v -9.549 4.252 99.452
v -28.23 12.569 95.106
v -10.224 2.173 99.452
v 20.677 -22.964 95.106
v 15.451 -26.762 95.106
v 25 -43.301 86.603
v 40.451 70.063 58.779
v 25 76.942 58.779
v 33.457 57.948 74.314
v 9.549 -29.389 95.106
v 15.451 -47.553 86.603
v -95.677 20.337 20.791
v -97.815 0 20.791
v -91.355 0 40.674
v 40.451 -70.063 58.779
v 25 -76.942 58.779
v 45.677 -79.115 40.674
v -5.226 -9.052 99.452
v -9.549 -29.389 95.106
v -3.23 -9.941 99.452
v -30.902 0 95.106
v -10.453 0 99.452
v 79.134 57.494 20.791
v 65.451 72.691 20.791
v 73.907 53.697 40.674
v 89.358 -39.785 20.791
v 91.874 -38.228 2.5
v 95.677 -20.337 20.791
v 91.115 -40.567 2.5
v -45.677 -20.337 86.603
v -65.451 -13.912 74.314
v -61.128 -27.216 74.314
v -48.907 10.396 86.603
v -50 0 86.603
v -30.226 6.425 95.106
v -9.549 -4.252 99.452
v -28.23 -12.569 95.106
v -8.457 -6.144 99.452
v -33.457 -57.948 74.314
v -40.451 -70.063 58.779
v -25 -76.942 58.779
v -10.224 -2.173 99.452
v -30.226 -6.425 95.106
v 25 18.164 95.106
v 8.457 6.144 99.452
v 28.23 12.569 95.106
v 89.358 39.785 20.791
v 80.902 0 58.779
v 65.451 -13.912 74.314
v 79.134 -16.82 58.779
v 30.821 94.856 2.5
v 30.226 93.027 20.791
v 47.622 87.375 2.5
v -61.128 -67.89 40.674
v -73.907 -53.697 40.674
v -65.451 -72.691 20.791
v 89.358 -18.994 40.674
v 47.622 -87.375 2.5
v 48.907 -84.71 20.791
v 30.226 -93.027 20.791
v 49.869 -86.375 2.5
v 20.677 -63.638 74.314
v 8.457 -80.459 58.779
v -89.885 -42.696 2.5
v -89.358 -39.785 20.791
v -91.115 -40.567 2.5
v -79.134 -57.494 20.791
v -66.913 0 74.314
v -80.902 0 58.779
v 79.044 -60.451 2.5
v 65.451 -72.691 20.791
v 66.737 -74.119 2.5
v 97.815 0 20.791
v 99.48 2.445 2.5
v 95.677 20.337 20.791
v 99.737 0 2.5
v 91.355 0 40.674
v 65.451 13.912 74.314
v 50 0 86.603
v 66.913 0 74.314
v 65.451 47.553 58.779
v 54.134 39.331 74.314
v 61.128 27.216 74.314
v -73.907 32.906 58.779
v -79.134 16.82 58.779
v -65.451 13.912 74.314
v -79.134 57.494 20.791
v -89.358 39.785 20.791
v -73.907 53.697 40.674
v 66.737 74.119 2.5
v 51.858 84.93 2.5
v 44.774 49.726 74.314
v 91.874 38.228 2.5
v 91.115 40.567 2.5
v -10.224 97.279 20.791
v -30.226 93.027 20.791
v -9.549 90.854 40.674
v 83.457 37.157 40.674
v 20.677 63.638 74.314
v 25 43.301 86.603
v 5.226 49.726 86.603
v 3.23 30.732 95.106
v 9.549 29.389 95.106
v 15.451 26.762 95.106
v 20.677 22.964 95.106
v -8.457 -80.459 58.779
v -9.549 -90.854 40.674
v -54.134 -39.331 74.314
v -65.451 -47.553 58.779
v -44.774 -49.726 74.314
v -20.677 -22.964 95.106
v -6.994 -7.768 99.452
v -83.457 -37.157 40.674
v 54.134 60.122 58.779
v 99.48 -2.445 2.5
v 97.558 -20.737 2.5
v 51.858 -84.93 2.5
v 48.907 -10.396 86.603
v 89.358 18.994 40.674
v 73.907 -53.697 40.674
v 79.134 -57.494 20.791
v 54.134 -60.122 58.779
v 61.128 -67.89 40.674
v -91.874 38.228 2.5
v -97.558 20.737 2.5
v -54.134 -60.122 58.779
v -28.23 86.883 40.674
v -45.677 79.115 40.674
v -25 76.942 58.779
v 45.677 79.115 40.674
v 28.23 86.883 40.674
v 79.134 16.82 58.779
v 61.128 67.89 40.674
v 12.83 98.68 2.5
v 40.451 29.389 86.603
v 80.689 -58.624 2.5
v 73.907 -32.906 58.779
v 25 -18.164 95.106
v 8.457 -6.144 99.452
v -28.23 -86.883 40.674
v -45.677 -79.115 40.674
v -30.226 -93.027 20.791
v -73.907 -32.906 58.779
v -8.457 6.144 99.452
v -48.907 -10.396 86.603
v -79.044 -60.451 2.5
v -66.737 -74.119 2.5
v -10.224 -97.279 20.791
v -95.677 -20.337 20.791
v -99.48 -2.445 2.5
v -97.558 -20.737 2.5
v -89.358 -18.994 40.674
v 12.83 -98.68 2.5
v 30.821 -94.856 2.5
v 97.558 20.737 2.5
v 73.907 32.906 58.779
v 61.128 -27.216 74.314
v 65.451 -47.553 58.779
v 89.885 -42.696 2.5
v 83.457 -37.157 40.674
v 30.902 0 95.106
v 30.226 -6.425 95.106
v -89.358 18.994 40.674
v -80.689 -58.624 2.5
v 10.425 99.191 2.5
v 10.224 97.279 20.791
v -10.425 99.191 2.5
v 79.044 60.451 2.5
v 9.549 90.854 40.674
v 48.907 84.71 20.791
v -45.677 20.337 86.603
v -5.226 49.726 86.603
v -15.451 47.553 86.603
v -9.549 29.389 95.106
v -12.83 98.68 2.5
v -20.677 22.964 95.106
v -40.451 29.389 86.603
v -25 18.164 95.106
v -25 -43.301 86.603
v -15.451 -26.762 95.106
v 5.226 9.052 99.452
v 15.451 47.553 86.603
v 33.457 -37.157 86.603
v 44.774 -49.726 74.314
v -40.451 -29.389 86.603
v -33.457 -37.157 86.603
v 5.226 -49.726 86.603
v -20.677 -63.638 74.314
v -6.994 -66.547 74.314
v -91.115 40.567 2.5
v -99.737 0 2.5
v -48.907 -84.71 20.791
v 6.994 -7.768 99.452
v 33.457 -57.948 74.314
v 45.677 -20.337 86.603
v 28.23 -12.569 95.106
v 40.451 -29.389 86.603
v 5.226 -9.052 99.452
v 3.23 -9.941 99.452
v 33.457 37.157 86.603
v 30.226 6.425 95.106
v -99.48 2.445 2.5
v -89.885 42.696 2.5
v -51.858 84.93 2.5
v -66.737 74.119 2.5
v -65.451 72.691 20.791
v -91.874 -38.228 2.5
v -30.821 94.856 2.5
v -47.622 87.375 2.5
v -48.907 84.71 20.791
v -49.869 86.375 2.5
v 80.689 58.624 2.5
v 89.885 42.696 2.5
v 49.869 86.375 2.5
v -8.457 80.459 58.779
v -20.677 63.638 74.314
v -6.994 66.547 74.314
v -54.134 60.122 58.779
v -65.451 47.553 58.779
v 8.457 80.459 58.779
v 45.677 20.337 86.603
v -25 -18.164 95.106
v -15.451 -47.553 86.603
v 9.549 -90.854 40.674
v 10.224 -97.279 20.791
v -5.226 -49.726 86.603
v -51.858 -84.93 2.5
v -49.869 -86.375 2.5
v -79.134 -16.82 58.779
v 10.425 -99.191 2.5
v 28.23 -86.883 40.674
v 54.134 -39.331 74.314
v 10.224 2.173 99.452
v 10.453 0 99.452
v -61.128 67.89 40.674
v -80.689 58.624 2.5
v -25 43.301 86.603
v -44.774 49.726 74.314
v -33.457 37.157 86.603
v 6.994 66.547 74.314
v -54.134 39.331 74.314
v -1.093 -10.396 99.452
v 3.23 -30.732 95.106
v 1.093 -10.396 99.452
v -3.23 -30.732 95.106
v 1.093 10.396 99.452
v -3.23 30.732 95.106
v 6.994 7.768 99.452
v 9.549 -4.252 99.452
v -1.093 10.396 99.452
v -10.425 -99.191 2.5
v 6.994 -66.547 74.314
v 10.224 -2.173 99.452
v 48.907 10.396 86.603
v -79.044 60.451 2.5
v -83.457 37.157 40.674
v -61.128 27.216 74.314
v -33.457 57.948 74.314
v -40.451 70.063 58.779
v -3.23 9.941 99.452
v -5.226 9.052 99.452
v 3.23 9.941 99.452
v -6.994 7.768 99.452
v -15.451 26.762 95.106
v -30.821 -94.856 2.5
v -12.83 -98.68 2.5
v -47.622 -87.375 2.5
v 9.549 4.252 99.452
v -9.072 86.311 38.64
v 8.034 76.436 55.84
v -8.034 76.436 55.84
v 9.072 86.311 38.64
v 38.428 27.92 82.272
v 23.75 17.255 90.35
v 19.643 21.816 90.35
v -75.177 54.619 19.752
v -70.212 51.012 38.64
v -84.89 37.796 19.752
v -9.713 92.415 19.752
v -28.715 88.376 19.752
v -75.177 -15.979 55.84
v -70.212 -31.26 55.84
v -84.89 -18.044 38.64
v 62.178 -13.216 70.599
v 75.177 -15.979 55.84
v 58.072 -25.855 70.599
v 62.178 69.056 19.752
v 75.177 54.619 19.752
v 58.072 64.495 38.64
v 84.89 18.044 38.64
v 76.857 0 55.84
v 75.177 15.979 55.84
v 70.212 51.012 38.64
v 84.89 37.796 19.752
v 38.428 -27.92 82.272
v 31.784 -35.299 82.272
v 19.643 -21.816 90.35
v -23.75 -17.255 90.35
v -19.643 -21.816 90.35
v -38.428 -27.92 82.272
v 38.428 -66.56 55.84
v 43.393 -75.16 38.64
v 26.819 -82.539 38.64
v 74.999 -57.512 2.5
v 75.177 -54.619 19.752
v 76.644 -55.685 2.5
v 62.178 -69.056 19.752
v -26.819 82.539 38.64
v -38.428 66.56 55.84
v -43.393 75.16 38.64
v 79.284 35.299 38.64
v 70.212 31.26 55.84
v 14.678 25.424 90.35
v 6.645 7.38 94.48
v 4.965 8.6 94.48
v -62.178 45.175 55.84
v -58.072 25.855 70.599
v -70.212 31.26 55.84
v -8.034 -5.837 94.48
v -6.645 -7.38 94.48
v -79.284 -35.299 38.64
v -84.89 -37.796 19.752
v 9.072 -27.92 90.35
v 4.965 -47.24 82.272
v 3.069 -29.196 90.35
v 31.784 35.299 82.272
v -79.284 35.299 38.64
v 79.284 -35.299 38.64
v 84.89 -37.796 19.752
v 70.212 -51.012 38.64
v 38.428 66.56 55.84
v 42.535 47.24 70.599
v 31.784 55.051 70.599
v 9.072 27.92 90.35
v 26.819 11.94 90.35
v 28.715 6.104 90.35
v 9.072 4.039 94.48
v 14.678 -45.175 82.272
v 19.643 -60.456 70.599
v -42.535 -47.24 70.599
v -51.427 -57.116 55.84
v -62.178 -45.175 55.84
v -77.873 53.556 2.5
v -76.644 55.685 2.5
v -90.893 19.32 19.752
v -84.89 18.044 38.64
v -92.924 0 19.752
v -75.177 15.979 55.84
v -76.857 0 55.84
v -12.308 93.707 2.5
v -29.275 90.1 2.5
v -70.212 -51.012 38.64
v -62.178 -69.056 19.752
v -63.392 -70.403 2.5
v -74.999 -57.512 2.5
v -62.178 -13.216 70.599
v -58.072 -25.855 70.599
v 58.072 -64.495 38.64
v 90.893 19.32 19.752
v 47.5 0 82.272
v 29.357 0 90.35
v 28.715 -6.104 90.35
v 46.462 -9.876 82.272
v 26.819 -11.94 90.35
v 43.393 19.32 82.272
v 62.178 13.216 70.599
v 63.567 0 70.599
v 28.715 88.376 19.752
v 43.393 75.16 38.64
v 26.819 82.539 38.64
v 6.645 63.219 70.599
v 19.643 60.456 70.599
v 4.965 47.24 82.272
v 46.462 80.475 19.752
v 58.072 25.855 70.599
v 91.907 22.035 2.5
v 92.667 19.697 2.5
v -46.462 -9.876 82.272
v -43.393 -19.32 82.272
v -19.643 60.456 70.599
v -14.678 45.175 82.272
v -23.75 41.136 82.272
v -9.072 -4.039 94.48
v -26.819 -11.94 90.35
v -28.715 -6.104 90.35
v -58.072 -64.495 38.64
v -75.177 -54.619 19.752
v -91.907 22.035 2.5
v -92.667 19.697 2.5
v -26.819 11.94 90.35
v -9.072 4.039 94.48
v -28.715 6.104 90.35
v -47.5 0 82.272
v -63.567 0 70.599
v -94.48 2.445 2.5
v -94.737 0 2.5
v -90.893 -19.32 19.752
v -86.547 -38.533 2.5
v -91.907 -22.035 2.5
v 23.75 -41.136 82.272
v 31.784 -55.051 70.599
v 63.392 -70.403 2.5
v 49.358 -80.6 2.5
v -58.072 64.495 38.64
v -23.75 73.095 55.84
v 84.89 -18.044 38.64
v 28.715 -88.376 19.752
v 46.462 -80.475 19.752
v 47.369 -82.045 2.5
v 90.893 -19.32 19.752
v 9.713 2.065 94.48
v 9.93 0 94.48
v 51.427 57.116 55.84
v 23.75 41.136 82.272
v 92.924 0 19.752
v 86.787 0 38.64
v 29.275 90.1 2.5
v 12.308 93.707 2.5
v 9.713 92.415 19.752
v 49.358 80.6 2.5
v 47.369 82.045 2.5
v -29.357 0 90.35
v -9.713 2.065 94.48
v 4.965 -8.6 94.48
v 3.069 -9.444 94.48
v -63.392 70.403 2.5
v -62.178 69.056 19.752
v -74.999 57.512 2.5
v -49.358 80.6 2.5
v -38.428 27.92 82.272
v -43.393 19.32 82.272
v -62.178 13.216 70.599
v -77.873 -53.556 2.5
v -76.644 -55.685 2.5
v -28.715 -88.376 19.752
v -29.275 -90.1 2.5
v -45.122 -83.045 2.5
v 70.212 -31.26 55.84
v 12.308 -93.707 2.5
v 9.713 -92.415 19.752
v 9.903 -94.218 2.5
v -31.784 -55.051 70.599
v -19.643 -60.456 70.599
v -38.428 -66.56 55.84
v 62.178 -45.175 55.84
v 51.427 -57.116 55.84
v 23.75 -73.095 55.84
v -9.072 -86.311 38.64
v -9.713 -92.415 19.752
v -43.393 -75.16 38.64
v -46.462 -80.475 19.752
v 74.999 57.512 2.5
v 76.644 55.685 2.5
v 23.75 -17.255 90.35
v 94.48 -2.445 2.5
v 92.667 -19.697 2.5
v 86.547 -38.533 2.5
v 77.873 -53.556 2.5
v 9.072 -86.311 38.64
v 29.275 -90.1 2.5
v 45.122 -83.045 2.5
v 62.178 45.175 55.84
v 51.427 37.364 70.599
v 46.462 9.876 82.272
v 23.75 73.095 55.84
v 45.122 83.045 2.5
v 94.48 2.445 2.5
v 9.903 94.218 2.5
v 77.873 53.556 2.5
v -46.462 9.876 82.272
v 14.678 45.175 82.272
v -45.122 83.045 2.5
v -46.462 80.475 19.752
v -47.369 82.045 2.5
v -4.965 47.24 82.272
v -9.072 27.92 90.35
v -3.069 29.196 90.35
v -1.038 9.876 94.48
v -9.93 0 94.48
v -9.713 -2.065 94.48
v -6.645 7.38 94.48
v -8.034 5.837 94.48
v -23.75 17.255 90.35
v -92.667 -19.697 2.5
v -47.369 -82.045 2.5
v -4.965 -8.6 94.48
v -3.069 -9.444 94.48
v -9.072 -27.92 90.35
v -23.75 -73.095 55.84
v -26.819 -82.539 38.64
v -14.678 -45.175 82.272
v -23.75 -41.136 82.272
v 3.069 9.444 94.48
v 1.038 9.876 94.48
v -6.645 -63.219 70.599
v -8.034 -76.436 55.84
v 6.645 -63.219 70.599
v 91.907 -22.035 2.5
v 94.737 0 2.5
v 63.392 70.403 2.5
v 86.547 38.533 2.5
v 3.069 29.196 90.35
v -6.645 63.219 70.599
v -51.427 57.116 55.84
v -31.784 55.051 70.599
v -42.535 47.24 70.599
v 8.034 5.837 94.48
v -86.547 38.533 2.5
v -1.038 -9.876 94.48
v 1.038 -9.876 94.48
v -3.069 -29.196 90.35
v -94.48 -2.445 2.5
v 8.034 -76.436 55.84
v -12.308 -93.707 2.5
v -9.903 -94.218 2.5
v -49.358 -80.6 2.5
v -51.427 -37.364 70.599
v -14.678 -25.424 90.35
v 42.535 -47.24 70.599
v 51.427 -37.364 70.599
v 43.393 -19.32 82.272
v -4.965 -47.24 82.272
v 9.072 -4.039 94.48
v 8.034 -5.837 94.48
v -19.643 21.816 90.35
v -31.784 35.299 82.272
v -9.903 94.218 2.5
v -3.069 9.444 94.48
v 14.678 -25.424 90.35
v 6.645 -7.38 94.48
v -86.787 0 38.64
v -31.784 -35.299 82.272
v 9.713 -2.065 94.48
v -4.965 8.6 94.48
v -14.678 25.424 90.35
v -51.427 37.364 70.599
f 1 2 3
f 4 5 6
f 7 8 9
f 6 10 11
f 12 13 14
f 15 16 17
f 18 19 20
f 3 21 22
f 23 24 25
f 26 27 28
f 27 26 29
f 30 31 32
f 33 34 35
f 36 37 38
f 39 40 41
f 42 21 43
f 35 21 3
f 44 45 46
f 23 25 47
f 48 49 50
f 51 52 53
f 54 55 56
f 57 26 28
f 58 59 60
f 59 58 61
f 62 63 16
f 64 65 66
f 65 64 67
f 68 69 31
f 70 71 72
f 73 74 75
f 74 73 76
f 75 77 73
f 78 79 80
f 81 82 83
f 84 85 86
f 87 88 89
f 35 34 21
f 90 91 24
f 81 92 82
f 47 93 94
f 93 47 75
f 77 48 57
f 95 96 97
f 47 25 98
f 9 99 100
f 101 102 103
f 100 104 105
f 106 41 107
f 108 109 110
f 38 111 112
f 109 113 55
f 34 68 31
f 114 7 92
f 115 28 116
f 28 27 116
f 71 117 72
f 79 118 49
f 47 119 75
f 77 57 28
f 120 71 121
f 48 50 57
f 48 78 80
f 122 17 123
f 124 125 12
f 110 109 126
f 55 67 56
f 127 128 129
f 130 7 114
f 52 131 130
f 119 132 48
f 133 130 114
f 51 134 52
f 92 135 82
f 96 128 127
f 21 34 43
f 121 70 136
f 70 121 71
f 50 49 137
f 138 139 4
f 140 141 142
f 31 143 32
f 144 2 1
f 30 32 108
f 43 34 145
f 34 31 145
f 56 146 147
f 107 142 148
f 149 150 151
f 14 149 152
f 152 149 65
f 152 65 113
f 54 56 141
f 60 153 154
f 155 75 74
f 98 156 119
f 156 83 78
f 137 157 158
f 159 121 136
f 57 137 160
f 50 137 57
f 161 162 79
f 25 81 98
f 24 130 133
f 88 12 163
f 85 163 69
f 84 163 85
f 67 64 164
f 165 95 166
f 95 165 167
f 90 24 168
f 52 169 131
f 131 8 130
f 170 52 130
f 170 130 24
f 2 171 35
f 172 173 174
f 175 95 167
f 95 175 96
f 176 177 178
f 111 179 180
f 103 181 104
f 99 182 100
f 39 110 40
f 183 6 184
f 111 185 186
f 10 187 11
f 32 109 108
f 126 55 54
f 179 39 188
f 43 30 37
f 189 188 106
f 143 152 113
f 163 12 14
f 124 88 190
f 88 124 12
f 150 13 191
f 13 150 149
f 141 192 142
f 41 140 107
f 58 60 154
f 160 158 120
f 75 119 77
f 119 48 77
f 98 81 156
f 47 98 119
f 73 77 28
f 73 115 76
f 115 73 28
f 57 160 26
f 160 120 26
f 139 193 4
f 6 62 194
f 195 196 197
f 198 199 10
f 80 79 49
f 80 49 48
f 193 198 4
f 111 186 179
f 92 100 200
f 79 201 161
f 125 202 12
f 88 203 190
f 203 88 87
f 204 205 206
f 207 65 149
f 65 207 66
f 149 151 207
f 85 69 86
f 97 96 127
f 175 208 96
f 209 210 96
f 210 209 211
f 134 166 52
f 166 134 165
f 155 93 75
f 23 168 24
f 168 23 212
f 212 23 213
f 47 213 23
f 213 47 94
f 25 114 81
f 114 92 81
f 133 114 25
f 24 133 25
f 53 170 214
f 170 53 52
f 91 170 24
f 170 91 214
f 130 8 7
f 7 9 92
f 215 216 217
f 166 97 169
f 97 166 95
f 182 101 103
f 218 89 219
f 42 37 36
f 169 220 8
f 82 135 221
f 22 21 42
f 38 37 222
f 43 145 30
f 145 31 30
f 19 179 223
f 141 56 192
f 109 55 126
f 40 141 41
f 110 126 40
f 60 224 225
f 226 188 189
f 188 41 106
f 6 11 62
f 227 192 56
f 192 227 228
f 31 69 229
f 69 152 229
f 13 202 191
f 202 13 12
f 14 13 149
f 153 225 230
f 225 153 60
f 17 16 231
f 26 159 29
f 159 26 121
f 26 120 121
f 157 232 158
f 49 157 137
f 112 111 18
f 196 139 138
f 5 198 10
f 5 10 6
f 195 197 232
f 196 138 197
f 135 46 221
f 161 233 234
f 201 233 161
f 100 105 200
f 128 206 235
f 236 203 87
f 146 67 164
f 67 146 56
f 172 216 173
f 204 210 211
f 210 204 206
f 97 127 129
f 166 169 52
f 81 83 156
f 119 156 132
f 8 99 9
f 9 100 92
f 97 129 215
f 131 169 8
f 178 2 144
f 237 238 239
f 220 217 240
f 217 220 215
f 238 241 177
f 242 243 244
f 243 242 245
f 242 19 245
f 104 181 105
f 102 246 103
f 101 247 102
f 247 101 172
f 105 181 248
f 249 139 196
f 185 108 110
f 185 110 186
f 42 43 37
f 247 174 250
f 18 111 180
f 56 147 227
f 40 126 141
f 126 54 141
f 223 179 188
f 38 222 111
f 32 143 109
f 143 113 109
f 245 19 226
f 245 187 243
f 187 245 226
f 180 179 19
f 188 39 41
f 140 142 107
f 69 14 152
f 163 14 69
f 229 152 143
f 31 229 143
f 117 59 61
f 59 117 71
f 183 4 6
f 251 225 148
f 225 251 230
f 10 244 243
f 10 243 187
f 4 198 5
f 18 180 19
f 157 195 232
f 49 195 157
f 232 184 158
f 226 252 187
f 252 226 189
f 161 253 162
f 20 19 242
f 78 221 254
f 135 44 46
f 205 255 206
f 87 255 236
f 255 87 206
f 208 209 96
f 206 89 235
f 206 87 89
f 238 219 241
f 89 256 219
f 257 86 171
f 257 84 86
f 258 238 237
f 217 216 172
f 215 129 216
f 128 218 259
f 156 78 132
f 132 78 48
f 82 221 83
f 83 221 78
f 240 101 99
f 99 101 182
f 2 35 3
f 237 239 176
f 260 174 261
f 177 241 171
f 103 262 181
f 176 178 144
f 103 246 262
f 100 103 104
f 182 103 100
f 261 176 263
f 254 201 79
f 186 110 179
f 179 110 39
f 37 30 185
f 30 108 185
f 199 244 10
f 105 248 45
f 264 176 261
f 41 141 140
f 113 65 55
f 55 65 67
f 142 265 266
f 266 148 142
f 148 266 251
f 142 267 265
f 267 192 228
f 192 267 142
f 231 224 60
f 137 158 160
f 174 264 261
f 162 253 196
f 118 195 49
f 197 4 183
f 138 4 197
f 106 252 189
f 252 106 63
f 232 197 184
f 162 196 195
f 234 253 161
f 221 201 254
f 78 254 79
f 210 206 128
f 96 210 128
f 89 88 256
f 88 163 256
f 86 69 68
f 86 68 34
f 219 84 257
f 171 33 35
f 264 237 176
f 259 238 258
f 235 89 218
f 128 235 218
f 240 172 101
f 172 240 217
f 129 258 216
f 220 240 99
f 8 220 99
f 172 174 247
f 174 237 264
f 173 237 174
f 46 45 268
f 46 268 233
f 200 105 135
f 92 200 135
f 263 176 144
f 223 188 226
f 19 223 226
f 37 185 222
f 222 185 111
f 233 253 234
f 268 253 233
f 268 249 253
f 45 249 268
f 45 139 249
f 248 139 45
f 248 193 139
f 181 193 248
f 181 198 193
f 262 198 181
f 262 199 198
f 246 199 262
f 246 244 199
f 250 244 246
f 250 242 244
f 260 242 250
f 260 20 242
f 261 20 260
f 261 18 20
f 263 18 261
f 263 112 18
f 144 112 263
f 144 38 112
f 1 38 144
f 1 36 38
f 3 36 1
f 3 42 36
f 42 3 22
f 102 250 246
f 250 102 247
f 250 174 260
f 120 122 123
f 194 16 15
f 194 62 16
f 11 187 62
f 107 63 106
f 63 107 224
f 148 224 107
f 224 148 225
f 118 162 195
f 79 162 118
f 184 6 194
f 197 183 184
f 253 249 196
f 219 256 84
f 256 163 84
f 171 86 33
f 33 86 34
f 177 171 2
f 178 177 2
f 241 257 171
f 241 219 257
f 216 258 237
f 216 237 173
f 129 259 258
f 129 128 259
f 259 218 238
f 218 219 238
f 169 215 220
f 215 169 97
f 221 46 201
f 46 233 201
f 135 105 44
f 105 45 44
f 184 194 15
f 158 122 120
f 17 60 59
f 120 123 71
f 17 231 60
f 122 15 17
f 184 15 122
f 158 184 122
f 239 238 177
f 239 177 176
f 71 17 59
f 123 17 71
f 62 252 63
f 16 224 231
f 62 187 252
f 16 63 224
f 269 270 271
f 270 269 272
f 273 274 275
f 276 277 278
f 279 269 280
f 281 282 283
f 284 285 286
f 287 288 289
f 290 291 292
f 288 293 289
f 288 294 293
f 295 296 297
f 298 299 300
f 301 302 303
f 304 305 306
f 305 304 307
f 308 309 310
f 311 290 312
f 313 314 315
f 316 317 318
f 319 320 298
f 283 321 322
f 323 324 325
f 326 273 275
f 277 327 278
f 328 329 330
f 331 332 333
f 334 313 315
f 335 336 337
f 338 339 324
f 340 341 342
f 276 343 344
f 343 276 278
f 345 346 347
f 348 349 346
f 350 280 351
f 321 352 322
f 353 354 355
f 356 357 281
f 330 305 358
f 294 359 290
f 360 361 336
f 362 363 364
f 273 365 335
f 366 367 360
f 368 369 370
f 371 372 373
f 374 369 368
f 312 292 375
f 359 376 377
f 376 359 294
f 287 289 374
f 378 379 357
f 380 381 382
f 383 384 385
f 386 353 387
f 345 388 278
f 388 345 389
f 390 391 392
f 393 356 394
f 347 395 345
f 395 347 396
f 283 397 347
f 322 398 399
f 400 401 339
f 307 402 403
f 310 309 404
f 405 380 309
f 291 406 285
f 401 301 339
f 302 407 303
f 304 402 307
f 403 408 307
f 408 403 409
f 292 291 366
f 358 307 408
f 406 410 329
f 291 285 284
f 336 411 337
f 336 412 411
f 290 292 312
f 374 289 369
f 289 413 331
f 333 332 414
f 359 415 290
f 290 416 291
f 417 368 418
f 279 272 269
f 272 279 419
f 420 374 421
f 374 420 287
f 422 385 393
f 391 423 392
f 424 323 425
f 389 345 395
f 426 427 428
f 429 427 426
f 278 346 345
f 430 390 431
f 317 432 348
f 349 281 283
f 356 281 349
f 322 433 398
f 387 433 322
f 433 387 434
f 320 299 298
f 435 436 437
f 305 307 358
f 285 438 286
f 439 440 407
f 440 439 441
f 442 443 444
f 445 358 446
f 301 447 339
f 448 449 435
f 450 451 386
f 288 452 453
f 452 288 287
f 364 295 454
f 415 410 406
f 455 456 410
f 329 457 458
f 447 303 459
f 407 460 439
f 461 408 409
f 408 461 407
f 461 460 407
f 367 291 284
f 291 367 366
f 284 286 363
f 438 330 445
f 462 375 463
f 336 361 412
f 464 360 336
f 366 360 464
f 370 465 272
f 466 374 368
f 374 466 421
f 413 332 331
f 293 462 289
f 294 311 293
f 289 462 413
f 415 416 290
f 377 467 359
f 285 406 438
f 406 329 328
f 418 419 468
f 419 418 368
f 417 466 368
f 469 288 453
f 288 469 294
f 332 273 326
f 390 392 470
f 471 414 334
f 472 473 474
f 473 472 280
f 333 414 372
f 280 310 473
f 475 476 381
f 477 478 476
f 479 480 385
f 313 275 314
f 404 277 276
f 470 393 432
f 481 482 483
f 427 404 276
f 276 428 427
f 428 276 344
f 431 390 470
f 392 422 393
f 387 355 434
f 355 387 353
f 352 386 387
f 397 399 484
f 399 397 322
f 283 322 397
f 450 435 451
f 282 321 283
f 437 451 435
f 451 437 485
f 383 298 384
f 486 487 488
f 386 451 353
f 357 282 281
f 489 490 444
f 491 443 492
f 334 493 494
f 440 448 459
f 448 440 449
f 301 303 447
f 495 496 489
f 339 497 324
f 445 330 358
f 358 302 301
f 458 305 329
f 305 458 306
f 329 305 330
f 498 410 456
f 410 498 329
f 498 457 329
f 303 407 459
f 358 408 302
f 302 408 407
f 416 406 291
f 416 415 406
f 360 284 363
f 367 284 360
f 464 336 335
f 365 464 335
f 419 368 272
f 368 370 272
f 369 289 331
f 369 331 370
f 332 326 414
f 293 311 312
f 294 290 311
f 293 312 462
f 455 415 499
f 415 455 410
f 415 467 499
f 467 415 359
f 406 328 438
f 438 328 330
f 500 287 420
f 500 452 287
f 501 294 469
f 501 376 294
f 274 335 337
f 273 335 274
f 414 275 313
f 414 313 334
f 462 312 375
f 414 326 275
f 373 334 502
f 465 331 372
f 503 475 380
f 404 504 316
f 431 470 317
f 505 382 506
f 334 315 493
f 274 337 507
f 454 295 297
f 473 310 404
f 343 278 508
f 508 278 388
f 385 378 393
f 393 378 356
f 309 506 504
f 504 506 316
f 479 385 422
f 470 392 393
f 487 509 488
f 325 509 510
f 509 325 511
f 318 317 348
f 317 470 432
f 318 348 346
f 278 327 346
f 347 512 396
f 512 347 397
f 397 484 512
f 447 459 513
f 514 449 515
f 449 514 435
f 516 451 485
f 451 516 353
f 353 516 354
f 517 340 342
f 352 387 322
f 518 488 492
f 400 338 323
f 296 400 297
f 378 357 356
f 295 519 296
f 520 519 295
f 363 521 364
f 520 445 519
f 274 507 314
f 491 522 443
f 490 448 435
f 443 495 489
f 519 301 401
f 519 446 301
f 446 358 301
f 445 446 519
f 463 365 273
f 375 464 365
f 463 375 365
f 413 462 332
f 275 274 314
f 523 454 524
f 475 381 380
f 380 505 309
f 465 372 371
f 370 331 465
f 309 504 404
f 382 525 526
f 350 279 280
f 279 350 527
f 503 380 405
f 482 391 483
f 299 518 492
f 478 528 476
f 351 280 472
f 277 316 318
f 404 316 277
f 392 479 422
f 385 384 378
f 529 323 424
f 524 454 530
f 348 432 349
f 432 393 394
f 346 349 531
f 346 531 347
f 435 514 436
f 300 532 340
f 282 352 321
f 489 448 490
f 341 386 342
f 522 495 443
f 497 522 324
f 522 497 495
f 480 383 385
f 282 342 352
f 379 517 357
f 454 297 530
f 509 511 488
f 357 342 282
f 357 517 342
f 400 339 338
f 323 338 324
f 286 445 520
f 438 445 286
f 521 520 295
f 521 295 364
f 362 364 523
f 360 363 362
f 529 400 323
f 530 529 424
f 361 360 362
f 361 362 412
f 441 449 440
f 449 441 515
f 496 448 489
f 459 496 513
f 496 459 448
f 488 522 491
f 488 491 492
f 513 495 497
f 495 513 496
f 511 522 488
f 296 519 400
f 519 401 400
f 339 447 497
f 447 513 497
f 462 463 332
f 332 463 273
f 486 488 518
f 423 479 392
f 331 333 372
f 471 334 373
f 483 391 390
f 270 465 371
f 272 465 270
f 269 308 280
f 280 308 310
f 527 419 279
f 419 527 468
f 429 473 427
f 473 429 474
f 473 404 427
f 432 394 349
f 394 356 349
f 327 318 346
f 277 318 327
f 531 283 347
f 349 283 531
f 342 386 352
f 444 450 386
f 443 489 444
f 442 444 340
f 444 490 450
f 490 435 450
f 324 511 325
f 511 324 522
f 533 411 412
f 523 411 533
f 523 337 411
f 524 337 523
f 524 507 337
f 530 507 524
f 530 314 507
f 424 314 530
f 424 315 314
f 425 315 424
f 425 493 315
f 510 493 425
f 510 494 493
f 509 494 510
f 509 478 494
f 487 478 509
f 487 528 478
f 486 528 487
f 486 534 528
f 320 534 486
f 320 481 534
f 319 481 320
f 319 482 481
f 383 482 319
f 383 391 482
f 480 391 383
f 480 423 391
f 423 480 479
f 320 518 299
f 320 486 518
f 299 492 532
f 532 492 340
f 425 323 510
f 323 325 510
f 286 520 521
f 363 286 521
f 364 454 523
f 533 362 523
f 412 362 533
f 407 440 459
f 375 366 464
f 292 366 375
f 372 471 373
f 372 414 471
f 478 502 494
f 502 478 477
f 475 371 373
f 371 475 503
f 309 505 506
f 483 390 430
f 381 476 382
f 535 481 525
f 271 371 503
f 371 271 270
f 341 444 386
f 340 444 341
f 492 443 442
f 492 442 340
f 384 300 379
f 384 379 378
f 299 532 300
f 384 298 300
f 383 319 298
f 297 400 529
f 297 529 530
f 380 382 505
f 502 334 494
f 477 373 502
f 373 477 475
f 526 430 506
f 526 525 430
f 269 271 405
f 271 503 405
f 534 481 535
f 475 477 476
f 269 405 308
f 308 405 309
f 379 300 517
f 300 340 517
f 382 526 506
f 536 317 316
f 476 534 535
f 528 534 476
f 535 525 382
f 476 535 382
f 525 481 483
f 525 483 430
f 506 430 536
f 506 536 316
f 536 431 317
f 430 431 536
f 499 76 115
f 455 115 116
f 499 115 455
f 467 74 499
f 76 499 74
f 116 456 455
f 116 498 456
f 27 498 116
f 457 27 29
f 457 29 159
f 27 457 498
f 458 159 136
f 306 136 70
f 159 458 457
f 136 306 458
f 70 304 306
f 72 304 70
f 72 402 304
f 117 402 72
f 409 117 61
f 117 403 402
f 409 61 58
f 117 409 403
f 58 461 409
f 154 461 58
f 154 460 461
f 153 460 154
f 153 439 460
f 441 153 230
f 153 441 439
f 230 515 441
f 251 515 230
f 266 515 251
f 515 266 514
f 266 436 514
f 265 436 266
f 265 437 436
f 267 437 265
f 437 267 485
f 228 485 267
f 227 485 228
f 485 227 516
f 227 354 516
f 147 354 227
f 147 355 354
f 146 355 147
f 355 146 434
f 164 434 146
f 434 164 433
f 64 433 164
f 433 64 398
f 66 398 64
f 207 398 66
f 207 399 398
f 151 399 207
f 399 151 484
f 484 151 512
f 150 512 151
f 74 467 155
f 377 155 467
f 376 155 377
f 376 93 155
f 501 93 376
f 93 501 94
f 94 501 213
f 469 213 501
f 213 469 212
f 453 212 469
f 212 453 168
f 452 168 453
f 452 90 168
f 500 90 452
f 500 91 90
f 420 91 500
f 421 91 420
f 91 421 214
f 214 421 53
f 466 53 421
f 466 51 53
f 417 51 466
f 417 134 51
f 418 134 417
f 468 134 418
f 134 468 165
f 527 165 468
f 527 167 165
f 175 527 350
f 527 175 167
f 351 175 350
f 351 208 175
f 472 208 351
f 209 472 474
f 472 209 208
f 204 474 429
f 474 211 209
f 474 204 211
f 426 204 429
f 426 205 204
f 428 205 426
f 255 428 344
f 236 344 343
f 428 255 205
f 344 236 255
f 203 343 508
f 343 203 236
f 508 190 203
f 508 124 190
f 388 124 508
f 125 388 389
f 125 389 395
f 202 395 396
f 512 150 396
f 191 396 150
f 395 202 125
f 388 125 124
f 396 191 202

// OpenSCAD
module raw_calabash(r = 100, thick = 5, up = true, col = "SaddleBrown"){
    color(col)
    difference(){
        sphere(r = r);
        sphere(r = r-thick);
        translate([0,0,-r])
            cube(2*r+5, center = true);
    }
}

raw_calabash();
